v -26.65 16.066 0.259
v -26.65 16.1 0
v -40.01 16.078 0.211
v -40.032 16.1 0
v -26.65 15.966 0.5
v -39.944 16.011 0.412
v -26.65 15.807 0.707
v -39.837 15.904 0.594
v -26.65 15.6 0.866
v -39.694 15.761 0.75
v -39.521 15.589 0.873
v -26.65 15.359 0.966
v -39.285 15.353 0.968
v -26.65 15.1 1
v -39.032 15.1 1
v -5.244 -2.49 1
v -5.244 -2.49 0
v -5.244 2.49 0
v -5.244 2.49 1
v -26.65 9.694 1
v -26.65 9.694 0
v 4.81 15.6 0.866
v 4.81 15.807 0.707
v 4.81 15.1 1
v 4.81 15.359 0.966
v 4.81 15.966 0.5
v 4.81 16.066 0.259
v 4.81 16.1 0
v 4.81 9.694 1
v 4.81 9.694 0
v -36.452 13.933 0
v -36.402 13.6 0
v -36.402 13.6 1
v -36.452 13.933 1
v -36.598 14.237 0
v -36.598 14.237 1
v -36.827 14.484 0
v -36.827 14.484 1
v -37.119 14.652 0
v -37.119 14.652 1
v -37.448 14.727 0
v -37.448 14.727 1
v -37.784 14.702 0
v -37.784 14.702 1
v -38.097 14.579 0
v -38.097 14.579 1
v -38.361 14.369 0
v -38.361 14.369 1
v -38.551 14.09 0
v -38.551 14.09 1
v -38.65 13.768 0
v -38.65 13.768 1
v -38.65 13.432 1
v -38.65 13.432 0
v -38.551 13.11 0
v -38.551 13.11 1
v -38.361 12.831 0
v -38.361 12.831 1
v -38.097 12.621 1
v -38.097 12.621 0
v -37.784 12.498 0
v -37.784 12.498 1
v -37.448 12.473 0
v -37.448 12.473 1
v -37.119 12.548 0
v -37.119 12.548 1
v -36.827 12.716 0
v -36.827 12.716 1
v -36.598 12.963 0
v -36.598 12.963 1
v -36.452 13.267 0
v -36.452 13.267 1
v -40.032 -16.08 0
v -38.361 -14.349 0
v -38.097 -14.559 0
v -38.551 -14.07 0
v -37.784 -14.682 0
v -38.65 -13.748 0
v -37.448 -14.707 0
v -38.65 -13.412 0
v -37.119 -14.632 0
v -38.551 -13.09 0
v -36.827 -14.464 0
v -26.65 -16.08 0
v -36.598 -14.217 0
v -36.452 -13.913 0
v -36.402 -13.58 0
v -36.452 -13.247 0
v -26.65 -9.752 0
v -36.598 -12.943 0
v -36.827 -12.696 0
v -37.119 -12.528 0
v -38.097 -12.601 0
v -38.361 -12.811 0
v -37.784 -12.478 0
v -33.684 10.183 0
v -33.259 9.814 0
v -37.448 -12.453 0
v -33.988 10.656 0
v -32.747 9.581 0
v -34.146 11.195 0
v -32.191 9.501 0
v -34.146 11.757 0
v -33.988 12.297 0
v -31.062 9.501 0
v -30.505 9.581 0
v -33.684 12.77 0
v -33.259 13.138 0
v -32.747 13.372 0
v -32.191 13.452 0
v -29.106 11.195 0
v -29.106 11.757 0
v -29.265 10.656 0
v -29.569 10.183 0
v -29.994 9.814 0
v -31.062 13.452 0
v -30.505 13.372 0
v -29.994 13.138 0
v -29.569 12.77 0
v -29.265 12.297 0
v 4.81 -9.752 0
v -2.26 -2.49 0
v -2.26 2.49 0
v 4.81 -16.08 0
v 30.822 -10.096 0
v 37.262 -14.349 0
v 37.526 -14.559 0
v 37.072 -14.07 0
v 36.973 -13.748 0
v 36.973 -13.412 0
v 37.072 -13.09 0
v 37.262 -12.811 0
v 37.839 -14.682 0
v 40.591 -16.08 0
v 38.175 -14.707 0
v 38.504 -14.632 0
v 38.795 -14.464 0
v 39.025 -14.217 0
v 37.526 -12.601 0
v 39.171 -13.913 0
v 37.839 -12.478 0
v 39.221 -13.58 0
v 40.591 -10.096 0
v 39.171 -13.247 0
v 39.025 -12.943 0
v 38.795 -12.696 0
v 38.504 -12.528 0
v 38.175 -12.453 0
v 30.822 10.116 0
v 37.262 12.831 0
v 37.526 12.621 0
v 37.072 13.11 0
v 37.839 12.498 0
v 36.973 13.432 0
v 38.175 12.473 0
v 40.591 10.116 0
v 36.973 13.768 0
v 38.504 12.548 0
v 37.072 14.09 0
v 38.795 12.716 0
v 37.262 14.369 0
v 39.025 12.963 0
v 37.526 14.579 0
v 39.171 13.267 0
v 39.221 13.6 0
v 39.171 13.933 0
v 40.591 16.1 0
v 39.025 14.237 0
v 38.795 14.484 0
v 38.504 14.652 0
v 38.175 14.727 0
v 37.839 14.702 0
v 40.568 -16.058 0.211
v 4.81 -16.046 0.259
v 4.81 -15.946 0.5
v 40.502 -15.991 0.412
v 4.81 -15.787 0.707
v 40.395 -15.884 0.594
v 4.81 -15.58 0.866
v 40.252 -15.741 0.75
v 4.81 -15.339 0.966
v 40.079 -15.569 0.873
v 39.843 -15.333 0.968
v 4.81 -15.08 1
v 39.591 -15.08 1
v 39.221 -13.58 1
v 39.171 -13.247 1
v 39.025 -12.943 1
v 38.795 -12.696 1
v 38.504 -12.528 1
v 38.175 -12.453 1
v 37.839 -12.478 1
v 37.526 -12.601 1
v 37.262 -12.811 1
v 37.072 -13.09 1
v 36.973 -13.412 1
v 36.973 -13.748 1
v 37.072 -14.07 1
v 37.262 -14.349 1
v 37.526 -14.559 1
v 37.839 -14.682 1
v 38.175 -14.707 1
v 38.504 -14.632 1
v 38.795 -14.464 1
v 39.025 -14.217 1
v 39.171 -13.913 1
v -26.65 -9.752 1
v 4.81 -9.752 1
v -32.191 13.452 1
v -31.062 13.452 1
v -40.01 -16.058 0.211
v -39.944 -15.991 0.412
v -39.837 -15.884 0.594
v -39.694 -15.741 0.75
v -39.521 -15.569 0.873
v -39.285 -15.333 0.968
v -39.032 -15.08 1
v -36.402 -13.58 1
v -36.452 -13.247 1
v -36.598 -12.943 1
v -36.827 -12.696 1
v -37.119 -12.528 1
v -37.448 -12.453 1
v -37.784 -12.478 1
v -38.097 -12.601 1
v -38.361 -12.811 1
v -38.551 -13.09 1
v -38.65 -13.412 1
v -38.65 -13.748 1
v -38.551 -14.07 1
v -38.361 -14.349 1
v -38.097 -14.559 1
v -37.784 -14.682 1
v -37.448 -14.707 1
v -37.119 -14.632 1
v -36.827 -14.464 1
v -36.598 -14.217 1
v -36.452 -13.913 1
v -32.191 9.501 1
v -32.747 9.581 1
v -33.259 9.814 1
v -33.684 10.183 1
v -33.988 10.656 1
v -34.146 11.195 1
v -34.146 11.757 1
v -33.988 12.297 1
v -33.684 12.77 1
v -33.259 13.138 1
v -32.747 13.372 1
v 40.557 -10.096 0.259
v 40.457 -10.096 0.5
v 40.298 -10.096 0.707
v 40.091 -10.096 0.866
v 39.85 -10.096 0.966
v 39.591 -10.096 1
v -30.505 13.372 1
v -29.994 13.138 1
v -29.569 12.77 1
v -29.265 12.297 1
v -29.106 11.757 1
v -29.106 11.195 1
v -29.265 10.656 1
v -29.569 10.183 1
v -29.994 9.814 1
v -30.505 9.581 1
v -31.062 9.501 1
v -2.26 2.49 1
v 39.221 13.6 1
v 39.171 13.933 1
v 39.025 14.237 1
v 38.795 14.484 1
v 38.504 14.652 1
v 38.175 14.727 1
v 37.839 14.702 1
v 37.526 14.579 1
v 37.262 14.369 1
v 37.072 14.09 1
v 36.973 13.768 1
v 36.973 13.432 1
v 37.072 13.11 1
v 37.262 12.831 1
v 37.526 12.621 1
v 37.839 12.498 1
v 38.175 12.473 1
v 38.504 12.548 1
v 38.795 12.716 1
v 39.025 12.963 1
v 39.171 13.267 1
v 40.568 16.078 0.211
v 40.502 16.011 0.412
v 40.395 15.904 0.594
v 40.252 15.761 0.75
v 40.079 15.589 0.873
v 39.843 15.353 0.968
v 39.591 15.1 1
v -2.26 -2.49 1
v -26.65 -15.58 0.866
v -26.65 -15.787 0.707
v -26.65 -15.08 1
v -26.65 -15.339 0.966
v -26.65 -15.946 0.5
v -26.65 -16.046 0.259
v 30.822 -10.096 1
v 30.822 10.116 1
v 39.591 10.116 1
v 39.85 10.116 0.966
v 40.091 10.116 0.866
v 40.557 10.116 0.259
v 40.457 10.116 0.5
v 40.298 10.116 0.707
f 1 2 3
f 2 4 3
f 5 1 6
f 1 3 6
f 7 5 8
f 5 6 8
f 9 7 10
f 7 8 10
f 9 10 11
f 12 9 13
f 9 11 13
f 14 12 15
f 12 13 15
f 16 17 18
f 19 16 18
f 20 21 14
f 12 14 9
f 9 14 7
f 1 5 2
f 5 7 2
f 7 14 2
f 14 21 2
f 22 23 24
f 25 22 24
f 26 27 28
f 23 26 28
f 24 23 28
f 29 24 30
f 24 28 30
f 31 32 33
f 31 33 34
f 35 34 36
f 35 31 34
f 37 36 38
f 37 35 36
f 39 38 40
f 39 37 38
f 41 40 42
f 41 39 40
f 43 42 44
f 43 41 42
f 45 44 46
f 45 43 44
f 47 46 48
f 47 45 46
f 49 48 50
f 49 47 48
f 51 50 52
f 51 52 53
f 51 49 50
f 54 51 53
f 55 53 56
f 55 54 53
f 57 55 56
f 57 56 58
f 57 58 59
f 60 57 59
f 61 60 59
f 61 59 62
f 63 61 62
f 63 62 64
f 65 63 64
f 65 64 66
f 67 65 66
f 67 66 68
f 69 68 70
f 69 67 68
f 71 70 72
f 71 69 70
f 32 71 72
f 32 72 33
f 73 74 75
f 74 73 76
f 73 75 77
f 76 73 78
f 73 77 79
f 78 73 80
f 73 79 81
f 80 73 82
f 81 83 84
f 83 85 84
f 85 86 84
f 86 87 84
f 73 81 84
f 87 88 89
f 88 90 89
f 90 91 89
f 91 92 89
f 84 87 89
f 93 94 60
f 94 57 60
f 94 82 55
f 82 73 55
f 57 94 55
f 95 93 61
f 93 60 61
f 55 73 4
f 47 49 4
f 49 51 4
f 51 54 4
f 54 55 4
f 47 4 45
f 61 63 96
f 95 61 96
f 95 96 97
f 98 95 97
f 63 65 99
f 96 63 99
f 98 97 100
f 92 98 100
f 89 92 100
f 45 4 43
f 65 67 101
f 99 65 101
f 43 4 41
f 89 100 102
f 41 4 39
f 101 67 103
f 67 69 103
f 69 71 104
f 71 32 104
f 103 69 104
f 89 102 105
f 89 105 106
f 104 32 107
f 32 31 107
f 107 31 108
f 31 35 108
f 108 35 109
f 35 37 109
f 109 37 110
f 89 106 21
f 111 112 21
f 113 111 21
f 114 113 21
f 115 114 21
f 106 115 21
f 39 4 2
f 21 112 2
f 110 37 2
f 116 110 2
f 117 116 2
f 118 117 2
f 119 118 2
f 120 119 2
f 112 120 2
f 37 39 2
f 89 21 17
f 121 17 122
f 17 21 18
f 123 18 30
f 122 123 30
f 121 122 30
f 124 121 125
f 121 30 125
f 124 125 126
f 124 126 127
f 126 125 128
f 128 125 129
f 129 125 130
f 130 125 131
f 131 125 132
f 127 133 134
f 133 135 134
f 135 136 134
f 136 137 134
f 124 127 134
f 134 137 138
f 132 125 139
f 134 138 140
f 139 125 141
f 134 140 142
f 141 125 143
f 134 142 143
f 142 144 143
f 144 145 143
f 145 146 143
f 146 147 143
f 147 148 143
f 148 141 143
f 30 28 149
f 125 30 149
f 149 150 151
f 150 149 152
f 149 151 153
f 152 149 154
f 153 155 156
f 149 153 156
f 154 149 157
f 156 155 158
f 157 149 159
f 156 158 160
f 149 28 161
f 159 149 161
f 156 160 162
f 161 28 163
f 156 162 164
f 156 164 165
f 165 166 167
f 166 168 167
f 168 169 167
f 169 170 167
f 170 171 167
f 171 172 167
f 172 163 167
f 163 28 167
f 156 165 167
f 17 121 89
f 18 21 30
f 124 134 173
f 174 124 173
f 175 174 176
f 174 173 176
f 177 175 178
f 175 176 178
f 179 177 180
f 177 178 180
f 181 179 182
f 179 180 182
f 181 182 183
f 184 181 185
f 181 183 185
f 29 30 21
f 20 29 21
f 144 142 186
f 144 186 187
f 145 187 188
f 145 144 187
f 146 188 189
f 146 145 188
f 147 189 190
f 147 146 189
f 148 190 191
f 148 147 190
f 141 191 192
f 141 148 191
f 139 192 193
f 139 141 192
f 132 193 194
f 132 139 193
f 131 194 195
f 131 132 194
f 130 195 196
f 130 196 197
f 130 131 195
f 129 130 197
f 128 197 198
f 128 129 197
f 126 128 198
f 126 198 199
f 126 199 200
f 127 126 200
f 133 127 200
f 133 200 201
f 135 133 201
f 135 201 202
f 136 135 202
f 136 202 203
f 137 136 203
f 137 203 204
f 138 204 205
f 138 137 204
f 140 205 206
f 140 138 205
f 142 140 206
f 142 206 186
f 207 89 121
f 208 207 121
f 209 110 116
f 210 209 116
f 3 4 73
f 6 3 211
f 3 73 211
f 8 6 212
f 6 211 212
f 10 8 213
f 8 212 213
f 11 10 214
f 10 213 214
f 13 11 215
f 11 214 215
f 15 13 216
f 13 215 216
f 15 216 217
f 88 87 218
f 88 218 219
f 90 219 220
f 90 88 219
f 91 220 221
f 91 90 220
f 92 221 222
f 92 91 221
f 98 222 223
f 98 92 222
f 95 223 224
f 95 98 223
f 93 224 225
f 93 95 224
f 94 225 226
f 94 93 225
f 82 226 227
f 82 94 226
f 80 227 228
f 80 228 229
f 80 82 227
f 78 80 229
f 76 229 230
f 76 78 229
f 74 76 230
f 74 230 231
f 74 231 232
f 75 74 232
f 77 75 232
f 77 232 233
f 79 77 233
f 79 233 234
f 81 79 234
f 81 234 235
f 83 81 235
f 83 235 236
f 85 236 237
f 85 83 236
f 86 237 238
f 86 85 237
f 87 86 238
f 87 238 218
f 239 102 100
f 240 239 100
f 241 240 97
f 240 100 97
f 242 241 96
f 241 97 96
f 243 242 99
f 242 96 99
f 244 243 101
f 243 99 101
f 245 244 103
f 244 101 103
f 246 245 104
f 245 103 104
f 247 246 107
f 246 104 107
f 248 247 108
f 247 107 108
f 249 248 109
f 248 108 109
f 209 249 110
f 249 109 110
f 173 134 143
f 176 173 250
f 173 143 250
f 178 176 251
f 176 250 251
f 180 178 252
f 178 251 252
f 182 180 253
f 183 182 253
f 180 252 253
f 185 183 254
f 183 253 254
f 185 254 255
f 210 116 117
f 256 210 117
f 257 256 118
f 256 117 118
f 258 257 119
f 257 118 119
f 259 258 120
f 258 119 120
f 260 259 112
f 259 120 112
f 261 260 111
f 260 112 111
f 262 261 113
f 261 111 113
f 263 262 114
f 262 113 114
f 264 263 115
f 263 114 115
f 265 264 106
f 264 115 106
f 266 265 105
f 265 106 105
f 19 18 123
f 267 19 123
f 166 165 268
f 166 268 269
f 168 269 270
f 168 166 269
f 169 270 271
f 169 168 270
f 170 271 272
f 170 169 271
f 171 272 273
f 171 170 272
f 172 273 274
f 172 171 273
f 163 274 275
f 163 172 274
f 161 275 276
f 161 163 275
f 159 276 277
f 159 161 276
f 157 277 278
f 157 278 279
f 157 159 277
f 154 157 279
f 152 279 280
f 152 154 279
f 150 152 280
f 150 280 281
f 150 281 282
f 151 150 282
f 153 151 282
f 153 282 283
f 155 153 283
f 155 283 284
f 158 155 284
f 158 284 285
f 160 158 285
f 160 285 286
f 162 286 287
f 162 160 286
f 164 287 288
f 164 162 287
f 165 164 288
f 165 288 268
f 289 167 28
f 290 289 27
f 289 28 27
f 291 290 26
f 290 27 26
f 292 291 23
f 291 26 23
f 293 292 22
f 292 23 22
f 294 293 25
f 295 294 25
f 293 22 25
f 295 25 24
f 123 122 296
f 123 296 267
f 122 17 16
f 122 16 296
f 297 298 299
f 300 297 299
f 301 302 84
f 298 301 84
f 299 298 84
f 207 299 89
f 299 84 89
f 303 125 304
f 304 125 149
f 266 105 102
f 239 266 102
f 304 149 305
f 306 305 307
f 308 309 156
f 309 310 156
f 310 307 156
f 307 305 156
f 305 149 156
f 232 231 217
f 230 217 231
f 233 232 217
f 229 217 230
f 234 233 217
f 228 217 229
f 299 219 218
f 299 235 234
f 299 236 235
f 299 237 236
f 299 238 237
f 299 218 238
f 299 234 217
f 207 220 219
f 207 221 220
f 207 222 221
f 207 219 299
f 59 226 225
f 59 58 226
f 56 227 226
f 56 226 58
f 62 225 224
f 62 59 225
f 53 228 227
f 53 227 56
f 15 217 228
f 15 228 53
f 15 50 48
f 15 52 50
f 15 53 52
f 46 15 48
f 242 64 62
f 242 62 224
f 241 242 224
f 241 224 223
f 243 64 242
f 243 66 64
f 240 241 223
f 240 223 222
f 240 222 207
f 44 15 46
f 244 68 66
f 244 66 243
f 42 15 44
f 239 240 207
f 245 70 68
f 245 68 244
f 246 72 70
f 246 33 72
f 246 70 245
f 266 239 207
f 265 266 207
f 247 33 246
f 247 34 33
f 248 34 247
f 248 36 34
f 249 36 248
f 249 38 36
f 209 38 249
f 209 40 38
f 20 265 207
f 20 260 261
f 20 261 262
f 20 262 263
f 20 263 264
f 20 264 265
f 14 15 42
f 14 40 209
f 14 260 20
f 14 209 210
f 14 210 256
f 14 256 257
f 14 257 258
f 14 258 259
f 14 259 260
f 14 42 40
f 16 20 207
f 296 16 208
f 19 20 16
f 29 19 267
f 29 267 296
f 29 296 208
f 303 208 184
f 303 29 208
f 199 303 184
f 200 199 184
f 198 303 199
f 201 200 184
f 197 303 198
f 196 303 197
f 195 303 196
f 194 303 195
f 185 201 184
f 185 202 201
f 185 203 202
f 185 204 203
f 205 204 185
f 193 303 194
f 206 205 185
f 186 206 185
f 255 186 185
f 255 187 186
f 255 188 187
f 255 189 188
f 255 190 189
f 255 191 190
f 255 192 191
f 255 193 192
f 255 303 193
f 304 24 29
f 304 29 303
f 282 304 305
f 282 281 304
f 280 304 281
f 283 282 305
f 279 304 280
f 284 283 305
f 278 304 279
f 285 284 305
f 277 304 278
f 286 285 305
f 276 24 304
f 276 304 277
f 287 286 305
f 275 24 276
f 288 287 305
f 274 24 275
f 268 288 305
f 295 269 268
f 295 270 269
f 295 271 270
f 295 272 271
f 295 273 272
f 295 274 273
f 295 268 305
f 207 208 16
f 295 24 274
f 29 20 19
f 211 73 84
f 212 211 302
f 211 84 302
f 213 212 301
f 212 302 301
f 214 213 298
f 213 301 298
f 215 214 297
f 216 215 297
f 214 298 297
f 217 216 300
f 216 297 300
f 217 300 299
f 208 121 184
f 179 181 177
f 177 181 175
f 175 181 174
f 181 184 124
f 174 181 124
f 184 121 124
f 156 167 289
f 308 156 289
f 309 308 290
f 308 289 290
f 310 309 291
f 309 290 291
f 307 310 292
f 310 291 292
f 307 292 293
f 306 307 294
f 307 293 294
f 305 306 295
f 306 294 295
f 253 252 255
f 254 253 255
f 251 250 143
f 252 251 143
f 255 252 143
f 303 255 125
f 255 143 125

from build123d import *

# Parameters (mm, degrees)
SKETCH1_R           = 1.1303
SKETCH1_W           = 2.983921929
SKETCH1_H           = 4.98
BOSS_EXTRUDE1_DEPTH = 1
FILLET1_R           = 1


with BuildPart() as part:
    # Sketch1 → Boss-Extrude1 (new body)
    with BuildSketch(Plane.XY):
        Polygon((-26.65, 16.1), (-40.032188793, 16.1), (-40.032188793, -16.08), (-26.65, -16.08), (-26.65, -9.752186355), (4.81, -9.752186355), (4.81, -16.08), (40.590666929, -16.08), (40.590666929, -10.095824831), (30.822198497, -10.095824831), (30.822198497, 10.115824831), (40.590666929, 10.115824831), (40.590666929, 16.1), (4.81, 16.1), (4.81, 9.693936617), (-26.65, 9.693936617), align=None)
        with Locations((-37.532188793, 13.6)):
            Circle(SKETCH1_R, mode=Mode.SUBTRACT)
        with Locations((-37.532188793, -13.58)):
            Circle(SKETCH1_R, mode=Mode.SUBTRACT)
        with Locations((38.090666929, 13.6)):
            Circle(SKETCH1_R, mode=Mode.SUBTRACT)
        with Locations((38.090666929, -13.58)):
            Circle(SKETCH1_R, mode=Mode.SUBTRACT)
        with Locations((-3.751960965, 0)):
            Rectangle(SKETCH1_W, SKETCH1_H, mode=Mode.SUBTRACT)
        with BuildLine():
            Line((-32.190591627, 13.451742973), (-31.061789136, 13.451742973))
            ThreePointArc((-31.061789136, 13.451742973), (-29.086350608, 11.476304445), (-31.061789136, 9.500865917))
            Line((-31.061789136, 9.500865917), (-32.190591627, 9.500865917))
            ThreePointArc((-32.190591627, 9.500865917), (-34.166030155, 11.476304445), (-32.190591627, 13.451742973))
        make_face(mode=Mode.SUBTRACT)
    extrude(amount=BOSS_EXTRUDE1_DEPTH)

    # Fillet1
    fillet1_edges = [part.edges().sort_by_distance(p)[0] for p in [
        (40.590666929, 13.107912416, 1),
        (22.700333464, 16.1, 1),
        (40.590666929, -13.087912416, 1),
        (22.700333464, -16.08, 1),
        (-33.341094396, -16.08, 1),
        (-40.032188793, 0.01, 1),
        (-33.341094396, 16.1, 1),
    ]]
    fillet(fillet1_edges, radius=FILLET1_R - 0.0001)  # a hair under: the kernel refuses the full size


solid = part.part
